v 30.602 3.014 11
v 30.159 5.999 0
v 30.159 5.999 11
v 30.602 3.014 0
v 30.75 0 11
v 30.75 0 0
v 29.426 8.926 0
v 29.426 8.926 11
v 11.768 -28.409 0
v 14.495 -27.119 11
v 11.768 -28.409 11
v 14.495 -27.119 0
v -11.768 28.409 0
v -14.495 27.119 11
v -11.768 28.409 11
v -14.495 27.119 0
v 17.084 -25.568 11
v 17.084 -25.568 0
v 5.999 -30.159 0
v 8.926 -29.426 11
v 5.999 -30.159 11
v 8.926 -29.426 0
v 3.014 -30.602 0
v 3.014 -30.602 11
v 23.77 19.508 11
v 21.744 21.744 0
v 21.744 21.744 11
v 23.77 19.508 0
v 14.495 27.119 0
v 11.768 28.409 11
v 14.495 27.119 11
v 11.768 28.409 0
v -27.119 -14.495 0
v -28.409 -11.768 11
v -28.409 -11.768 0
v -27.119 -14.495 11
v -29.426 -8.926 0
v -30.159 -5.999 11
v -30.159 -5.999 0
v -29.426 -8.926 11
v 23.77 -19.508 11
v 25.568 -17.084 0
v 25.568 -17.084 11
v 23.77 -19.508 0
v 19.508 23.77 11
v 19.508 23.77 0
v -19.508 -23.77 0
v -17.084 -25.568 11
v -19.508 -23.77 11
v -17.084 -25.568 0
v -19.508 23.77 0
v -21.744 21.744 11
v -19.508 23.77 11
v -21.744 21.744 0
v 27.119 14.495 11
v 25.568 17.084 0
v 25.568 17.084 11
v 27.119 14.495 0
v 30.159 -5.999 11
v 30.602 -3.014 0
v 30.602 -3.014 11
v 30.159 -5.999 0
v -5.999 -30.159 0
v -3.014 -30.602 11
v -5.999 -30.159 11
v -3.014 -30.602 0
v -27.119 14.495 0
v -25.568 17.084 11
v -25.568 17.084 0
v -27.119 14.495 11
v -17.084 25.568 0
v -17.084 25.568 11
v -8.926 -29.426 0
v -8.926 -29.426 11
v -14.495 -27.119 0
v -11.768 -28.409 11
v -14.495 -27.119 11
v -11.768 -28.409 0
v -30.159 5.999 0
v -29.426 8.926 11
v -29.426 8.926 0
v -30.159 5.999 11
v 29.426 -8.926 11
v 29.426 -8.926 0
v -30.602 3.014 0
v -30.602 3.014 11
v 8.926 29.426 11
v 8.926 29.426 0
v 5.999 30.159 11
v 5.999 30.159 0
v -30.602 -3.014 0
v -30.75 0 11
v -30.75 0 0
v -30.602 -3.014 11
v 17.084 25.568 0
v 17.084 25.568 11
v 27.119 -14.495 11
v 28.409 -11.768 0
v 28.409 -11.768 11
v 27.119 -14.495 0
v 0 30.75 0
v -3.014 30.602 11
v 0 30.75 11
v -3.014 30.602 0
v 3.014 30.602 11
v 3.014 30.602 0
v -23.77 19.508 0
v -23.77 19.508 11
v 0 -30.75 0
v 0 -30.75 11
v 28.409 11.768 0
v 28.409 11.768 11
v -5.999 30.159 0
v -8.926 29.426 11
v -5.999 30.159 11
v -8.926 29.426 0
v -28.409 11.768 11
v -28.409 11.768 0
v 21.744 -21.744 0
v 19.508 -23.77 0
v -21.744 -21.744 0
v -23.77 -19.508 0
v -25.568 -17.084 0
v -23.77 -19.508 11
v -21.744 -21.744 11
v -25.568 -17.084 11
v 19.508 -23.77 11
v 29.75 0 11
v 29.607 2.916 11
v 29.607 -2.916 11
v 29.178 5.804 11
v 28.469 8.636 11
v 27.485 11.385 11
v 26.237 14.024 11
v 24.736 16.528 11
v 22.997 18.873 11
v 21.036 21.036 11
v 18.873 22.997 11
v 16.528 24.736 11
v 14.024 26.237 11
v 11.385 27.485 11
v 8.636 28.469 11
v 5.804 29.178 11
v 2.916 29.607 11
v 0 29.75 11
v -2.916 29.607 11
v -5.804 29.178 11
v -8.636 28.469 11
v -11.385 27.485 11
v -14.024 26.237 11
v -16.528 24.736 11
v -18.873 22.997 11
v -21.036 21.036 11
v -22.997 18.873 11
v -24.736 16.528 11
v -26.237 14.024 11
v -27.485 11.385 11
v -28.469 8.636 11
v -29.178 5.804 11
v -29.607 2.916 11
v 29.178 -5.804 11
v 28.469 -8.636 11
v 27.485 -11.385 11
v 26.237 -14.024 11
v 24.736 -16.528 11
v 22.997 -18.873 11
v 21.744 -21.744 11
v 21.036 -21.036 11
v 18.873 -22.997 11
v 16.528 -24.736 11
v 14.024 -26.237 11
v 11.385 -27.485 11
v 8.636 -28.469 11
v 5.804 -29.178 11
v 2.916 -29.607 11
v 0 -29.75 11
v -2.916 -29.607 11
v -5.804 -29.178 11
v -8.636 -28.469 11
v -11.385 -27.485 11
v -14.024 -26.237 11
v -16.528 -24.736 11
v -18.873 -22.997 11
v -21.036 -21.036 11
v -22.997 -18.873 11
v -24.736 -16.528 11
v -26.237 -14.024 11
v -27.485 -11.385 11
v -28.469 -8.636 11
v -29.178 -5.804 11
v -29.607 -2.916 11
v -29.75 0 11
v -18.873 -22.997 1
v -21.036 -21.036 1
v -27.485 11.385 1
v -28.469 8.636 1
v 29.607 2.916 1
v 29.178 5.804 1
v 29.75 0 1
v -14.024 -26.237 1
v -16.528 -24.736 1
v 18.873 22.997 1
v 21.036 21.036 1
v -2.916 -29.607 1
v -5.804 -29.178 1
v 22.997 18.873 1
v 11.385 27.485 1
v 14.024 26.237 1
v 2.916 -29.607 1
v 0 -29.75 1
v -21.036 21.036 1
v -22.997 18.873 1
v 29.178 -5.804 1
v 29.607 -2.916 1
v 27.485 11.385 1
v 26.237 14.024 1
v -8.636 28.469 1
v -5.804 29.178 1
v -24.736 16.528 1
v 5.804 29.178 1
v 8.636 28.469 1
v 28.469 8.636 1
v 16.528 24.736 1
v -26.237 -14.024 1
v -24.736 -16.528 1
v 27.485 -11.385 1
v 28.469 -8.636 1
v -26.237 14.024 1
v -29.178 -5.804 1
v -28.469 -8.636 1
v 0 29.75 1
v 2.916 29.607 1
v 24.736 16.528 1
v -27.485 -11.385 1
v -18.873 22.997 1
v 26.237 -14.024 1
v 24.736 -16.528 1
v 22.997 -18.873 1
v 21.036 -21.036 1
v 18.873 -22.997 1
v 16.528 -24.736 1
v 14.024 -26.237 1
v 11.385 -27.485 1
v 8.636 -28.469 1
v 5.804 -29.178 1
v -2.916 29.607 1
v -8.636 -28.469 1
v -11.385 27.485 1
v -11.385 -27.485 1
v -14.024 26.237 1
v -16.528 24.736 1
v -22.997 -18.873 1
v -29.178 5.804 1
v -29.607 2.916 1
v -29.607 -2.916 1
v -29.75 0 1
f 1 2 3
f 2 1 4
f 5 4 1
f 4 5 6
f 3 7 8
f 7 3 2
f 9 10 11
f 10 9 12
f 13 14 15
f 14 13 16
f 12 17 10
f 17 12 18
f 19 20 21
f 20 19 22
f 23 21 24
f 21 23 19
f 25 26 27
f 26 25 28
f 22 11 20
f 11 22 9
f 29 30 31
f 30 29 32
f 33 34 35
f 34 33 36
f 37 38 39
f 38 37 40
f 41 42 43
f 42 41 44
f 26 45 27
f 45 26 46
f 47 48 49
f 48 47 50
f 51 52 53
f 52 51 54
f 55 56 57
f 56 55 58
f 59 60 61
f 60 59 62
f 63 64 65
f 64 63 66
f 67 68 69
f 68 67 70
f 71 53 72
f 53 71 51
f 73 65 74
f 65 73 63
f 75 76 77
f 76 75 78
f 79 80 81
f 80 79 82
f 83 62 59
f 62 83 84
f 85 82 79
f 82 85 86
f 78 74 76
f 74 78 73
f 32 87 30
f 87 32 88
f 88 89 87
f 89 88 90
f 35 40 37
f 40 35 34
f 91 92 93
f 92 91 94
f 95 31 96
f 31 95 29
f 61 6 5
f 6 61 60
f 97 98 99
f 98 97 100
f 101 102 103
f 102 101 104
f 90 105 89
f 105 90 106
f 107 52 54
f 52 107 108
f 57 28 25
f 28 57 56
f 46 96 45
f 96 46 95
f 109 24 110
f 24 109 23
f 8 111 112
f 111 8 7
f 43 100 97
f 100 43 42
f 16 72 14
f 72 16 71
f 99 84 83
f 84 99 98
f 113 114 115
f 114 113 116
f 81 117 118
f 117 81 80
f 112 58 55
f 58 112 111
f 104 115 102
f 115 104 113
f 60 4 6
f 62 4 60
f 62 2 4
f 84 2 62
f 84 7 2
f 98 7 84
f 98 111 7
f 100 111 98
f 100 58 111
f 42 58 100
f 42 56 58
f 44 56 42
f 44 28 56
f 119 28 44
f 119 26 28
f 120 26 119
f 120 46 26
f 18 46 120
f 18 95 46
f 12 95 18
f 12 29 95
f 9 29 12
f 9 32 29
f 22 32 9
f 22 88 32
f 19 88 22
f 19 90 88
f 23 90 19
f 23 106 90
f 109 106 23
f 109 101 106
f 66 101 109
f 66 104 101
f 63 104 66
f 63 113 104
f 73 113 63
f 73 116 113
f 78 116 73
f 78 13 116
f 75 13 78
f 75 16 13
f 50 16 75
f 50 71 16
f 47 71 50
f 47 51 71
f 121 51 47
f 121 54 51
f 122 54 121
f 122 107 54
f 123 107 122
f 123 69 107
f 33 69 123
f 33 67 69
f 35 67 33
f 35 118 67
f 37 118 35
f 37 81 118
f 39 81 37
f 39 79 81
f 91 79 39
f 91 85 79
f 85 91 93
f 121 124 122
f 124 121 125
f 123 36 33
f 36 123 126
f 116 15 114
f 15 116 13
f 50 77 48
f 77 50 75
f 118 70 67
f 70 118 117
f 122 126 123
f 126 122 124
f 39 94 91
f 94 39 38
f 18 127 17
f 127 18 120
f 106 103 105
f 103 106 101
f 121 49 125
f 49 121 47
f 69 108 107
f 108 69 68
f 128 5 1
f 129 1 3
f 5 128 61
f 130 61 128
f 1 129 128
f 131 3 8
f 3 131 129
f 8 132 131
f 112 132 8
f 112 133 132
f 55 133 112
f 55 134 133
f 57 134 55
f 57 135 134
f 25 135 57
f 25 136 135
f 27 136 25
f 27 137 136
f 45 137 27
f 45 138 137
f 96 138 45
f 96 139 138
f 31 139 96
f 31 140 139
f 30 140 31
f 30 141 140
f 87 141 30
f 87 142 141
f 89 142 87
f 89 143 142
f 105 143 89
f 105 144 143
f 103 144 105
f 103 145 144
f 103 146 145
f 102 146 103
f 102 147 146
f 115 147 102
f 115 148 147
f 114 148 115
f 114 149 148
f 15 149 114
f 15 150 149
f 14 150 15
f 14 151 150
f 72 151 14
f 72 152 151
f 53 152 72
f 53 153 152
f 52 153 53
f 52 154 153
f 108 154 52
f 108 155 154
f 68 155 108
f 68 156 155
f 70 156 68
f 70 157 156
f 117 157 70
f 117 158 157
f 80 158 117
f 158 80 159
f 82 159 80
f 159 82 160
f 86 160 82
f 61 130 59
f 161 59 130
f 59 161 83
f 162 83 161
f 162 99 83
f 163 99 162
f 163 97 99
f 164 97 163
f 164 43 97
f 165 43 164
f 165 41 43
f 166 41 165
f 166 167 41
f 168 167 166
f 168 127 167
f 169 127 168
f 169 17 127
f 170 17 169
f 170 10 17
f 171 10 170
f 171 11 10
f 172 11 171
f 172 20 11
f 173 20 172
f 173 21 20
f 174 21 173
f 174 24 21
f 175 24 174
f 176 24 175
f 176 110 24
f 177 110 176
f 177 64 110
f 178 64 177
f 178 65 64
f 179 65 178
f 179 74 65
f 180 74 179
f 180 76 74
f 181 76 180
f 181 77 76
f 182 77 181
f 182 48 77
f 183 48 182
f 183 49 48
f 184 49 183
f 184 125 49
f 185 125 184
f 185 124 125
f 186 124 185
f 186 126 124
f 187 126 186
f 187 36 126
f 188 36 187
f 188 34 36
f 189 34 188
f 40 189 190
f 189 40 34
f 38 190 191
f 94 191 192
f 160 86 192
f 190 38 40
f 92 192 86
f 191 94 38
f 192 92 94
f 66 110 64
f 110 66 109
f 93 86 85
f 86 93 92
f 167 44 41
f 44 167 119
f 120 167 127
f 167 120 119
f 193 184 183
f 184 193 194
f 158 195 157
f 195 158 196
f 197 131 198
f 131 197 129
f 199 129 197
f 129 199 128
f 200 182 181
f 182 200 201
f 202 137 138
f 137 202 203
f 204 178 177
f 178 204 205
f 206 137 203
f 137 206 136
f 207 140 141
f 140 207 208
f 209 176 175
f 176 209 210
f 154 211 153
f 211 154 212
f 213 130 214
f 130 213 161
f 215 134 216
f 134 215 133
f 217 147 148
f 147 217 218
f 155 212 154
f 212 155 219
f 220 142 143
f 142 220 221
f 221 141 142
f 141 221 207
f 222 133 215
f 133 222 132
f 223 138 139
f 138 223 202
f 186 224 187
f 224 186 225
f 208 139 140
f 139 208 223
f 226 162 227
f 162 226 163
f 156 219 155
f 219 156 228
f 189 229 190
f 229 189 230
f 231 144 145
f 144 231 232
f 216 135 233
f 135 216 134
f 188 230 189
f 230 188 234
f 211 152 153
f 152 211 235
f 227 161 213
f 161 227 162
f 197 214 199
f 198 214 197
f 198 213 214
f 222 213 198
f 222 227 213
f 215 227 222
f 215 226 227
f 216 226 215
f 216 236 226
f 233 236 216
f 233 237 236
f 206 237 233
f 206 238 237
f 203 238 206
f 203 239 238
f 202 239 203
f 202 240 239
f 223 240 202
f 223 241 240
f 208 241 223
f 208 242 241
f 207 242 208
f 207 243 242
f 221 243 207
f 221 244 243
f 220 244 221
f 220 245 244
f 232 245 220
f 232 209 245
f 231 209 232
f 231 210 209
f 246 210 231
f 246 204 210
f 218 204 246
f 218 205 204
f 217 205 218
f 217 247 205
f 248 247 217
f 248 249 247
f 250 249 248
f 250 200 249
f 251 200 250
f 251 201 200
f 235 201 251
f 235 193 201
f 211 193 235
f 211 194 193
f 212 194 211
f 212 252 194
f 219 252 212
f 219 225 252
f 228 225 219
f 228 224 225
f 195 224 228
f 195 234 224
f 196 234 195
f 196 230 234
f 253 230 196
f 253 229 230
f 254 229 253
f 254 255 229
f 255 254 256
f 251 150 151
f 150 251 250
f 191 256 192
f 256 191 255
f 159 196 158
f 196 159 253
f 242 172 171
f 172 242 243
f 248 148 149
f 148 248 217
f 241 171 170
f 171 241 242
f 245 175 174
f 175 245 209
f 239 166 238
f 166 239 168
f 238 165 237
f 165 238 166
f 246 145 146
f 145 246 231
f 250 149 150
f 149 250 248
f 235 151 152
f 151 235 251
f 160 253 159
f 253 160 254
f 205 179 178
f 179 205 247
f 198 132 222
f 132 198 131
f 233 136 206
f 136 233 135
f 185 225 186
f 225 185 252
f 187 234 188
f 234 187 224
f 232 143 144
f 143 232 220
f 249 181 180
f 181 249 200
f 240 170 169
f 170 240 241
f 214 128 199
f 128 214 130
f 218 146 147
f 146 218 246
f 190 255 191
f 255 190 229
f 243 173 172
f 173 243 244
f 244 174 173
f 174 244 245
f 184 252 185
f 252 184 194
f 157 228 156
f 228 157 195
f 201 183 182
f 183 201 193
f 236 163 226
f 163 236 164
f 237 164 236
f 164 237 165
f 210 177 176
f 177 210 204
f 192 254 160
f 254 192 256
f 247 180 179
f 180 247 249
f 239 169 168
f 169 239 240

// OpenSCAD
$fn=64;
r=59.5/2;

difference() {
  cylinder(r=r+1,h=11);
  translate([0,0,1]) cylinder(r=r,h=10.1);
}
